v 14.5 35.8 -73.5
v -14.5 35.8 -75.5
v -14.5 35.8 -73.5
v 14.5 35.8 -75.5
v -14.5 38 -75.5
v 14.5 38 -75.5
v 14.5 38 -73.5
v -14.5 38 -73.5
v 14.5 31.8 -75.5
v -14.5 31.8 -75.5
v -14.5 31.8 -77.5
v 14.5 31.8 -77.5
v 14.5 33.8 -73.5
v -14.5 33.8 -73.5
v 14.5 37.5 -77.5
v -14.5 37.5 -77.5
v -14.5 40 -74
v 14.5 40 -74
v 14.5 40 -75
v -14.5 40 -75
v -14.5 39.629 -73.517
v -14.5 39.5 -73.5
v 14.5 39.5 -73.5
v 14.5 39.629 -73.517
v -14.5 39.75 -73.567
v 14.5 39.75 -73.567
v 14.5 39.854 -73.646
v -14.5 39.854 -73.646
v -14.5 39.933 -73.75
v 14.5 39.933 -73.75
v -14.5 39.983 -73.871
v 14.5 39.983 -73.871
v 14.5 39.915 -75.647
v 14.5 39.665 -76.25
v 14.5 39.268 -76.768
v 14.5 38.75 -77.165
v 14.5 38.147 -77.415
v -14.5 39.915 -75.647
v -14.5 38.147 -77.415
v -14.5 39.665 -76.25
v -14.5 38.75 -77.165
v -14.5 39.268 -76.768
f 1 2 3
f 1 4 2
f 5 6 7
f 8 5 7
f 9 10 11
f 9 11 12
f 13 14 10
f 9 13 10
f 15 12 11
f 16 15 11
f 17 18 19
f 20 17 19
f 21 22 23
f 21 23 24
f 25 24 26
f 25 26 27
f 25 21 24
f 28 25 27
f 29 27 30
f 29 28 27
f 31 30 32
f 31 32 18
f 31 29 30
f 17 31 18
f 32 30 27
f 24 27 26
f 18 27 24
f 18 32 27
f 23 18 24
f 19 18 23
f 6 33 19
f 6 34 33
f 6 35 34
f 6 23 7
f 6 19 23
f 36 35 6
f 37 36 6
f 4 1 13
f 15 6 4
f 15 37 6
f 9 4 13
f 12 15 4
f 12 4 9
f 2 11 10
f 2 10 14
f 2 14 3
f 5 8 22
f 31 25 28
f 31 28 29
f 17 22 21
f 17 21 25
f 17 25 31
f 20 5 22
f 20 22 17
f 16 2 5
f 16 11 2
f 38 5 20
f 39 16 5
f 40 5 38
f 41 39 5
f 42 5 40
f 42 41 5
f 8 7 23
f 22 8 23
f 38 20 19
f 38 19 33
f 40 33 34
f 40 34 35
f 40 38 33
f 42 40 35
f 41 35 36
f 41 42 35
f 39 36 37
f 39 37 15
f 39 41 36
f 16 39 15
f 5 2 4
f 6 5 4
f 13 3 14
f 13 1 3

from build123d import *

# Parameters (mm, degrees)
SKETCH1_W                       = 39
SKETCH1_H                       = 155
BOSS_EXTRUDE1_DEPTH             = 2
BOSS_EXTRUDE2_DEPTH             = 38
SKETCH3_W                       = 2
SKETCH3_H                       = 2
BOSS_EXTRUDE3_DEPTH             = 38
SKETCH4_W                       = 2
SKETCH4_H                       = 2
BOSS_EXTRUDE4_DEPTH             = 151
SKETCH6_W                       = 35
SKETCH6_H                       = 2.2
CUT_EXTRUDE1_DEPTH              = 160.340045186
SKETCH7_W                       = 35
SKETCH7_H                       = 2.2
CUT_EXTRUDE2_DEPTH              = 89.490112442
SKETCH5_W                       = 31
SKETCH5_H                       = 2
BOSS_EXTRUDE5_DEPTH             = 2
BOSS_EXTRUDE6_REACH             = 91.367
SKETCH8_W                       = 2
SKETCH8_H                       = 2
BOSS_EXTRUDE6_DIRECTION_2_REACH = 91.367
SKETCH10_W                      = 2
SKETCH10_H                      = 2.2
SKETCH10_W_2                    = 2.2
SKETCH10_H_2                    = 2
BOSS_EXTRUDE8_DEPTH             = 2
SKETCH11_W                      = 2
SKETCH11_H                      = 2.2
SKETCH11_W_2                    = 2.2
SKETCH11_H_2                    = 2
BOSS_EXTRUDE9_DEPTH             = 2
FILLET2_R                       = 2.5
SKETCH14_W                      = 36.5
SKETCH14_H                      = 7.75
BOSS_EXTRUDE10_DEPTH            = 2
SKETCH13_W                      = 31
SKETCH13_H                      = 3
CUT_EXTRUDE4_DEPTH              = 2
FILLET3_R                       = 2
FILLET4_R                       = 0.5
SKETCH15_R                      = 5.1
CUT_EXTRUDE5_DEPTH              = 90.367219941
SKETCH16_R                      = 7.1
BOSS_EXTRUDE11_DEPTH            = 1
FILLET5_R                       = 0.5
CUT_EXTRUDE3_DEPTH              = 160.340045186
FILLET6_R                       = 0.4
FILLET7_R                       = 0.5
CUT_EXTRUDE6_DEPTH              = 6
SKETCH18_W                      = 29
SKETCH18_H                      = 3
CUT_EXTRUDE8_DEPTH              = 90.367220028
CUT_EXTRUDE11_DEPTH             = 90.367220028
CUT_EXTRUDE11_DEPTH_BACK        = 90.367220028
SKETCH20_W                      = 5
SKETCH20_H                      = 40
SKETCH21_W                      = 29
SKETCH21_H                      = 22.8
CUT_EXTRUDE12_DEPTH             = 43.594013669


with BuildPart() as part:
    # Sketch1 → Boss-Extrude1 (new body)
    with BuildSketch(Plane(origin=(0, 0, 0), x_dir=(1, 0, 0), z_dir=(0, 1, 0))):
        Rectangle(SKETCH1_W, SKETCH1_H)
    extrude(amount=BOSS_EXTRUDE1_DEPTH)

    # Sketch2 → Boss-Extrude2 (add)
    with BuildSketch(Plane(origin=(0, 2, 0), x_dir=(1, 0, 0), z_dir=(0, 1, 0))):
        Polygon((-17.5, -77.5), (-17.5, -75.5), (-17.5, 75.5), (17.5, 75.5), (17.5, -75.5), (17.5, -77.5), (19.5, -77.5), (19.5, 77.5), (-19.5, 77.5), (-19.5, -77.5), align=None)
    extrude(amount=BOSS_EXTRUDE2_DEPTH)

    # Sketch3 → Boss-Extrude3 (add)
    with BuildSketch(Plane(origin=(0, 2, 0), x_dir=(1, 0, 0), z_dir=(0, 1, 0))):
        with Locations((-16.5, -76.5)):
            Rectangle(SKETCH3_W, SKETCH3_H)
        with Locations((-16.5, -72.3)):
            Rectangle(SKETCH3_W, SKETCH3_H)
        with Locations((16.5, -76.5)):
            Rectangle(SKETCH3_W, SKETCH3_H)
        with Locations((16.5, -72.3)):
            Rectangle(SKETCH3_W, SKETCH3_H)
    extrude(amount=BOSS_EXTRUDE3_DEPTH)

    # Sketch4 → Boss-Extrude4 (add)
    with BuildSketch(Plane.XY.offset(-75.5)):
        with Locations((-16.5, 39)):
            Rectangle(SKETCH4_W, SKETCH4_H)
        Polygon((-15.5, 33.8), (-17.5, 31.8), (-17.5, 35.8), (-15.5, 35.8), align=None)
        Polygon((15.5, 35.8), (17.5, 35.8), (17.5, 31.8), (15.5, 33.8), align=None)
        with Locations((16.5, 39)):
            Rectangle(SKETCH4_W, SKETCH4_H)
    extrude(amount=BOSS_EXTRUDE4_DEPTH)

    # Sketch6 → Cut-Extrude1 (cut, through all)
    with BuildSketch(Plane.XY.offset(-75.5)):
        with Locations((0, 36.9)):
            Rectangle(SKETCH6_W, SKETCH6_H)
    extrude(amount=CUT_EXTRUDE1_DEPTH, mode=Mode.SUBTRACT)

    # Sketch7 → Cut-Extrude2 (cut, through all)
    with BuildSketch(Plane(origin=(0, 2, 0), x_dir=(1, 0, 0), z_dir=(0, 1, 0))):
        with Locations((0, -74.4)):
            Rectangle(SKETCH7_W, SKETCH7_H)
    extrude(amount=CUT_EXTRUDE2_DEPTH, mode=Mode.SUBTRACT)

    # Sketch5 → Boss-Extrude5 (add)
    with BuildSketch(Plane(origin=(0, 2, 0), x_dir=(1, 0, 0), z_dir=(0, 1, 0))):
        with Locations((0, -76.5)):
            Rectangle(SKETCH5_W, SKETCH5_H)
        with Locations((0, -72.3)):
            Rectangle(SKETCH5_W, SKETCH5_H)
    extrude(amount=BOSS_EXTRUDE5_DEPTH)

    # Boss-Extrude6: up to this face of the body (flat: up to its plane)
    boss_extrude6_end = Plane(part.part.faces().sort_by_distance((17.5, 16.9, -2.1))[0])
    # Sketch8 → Boss-Extrude6 (add, up to the picked face)
    with BuildSketch(Plane(origin=(0, 0, 0), x_dir=(0, 0, -1), z_dir=(1, 0, 0)), mode=Mode.PRIVATE) as boss_extrude6_sk1:
        with Locations((74.5, 39)):
            Rectangle(SKETCH8_W, SKETCH8_H)
    boss_extrude6_tool1 = split(extrude(boss_extrude6_sk1.sketch, amount=BOSS_EXTRUDE6_REACH, mode=Mode.PRIVATE), bisect_by=boss_extrude6_end, keep=Keep.BOTH, mode=Mode.PRIVATE)
    # Sketch8 → Boss-Extrude6 (add, up to the picked face)
    with BuildSketch(Plane(origin=(0, 0, 0), x_dir=(0, 0, -1), z_dir=(1, 0, 0)), mode=Mode.PRIVATE) as boss_extrude6_sk2:
        Polygon((75.5, 35.8), (73.5, 35.8), (73.5, 33.8), (75.5, 31.8), align=None)
    boss_extrude6_tool2 = split(extrude(boss_extrude6_sk2.sketch, amount=BOSS_EXTRUDE6_REACH, mode=Mode.PRIVATE), bisect_by=boss_extrude6_end, keep=Keep.BOTH, mode=Mode.PRIVATE)
    add(boss_extrude6_tool1.solids().sort_by(Axis((0, 39, -74.5), (1, 0, 0)))[0])
    add(boss_extrude6_tool2.solids().sort_by(Axis((0, 34.244444, -74.611111), (1, 0, 0)))[0])

    # Boss-Extrude6 direction 2: up to this face of the body (flat: up to its plane)
    boss_extrude6_direction_2_end = Plane(part.part.faces().sort_by_distance((-17.5, 16.9, -2.1))[0])
    # Sketch8 → Boss-Extrude6 direction 2 (add, up to the picked face)
    with BuildSketch(Plane(origin=(0, 0, 0), x_dir=(0, 0, -1), z_dir=(1, 0, 0)), mode=Mode.PRIVATE) as boss_extrude6_direction_2_sk1:
        with Locations((74.5, 39)):
            Rectangle(SKETCH8_W, SKETCH8_H)
    boss_extrude6_direction_2_tool1 = split(extrude(boss_extrude6_direction_2_sk1.sketch, amount=-BOSS_EXTRUDE6_DIRECTION_2_REACH, mode=Mode.PRIVATE), bisect_by=boss_extrude6_direction_2_end, keep=Keep.BOTH, mode=Mode.PRIVATE)
    # Sketch8 → Boss-Extrude6 direction 2 (add, up to the picked face)
    with BuildSketch(Plane(origin=(0, 0, 0), x_dir=(0, 0, -1), z_dir=(1, 0, 0)), mode=Mode.PRIVATE) as boss_extrude6_direction_2_sk2:
        Polygon((75.5, 35.8), (73.5, 35.8), (73.5, 33.8), (75.5, 31.8), align=None)
    boss_extrude6_direction_2_tool2 = split(extrude(boss_extrude6_direction_2_sk2.sketch, amount=-BOSS_EXTRUDE6_DIRECTION_2_REACH, mode=Mode.PRIVATE), bisect_by=boss_extrude6_direction_2_end, keep=Keep.BOTH, mode=Mode.PRIVATE)
    add(boss_extrude6_direction_2_tool1.solids().sort_by(Axis((0, 39, -74.5), (-1, 0, 0)))[0])
    add(boss_extrude6_direction_2_tool2.solids().sort_by(Axis((0, 34.244444, -74.611111), (-1, 0, 0)))[0])

    # Sketch10 → Boss-Extrude8 (add)
    with BuildSketch(Plane(origin=(-17.5, 0, 0), x_dir=(0, 0, -1), z_dir=(1, 0, 0))):
        with Locations((-76.5, 36.9)):
            Rectangle(SKETCH10_W, SKETCH10_H)
        with Locations((-74.4, 39)):
            Rectangle(SKETCH10_W_2, SKETCH10_H_2)
    extrude(amount=BOSS_EXTRUDE8_DEPTH)

    # Sketch11 → Boss-Extrude9 (add)
    with BuildSketch(Plane.ZY.offset(-17.5)):
        with Locations((76.5, 36.9)):
            Rectangle(SKETCH11_W, SKETCH11_H)
        with Locations((74.4, 39)):
            Rectangle(SKETCH11_W_2, SKETCH11_H_2)
    extrude(amount=BOSS_EXTRUDE9_DEPTH)

    # Fillet2
    fillet2_edges = [part.edges().sort_by_distance(p)[0] for p in [
        (-17.5, 16.9, 71.3),
        (17.5, 16.9, 71.3),
        (19.5, 20, 77.5),
        (-19.5, 20, 77.5),
        (-19.5, 20, -77.5),
        (-17.5, 16.9, -75.5),
        (17.5, 16.9, -75.5),
        (19.5, 20, -77.5),
        (19.5, 40, 0),
        (-19.5, 40, 0),
        (19.5, 0, 0),
        (-19.5, 0, 0),
        (0, 40, -77.5),
        (0, 0, 77.5),
        (0, 0, -77.5),
        (-17.5, 40, 77.5),
        (17.5, 40, 77.5),
    ]]
    fillet(fillet2_edges, radius=FILLET2_R)

    # Sketch14 → Boss-Extrude10 (add)
    with BuildSketch(Plane.XY.offset(-75.5)):
        with Locations((0, 5.125)):
            Rectangle(SKETCH14_W, SKETCH14_H)
    extrude(amount=BOSS_EXTRUDE10_DEPTH)

    # Sketch13 → Cut-Extrude4 (cut)
    with BuildSketch(Plane(origin=(0, 0, -77.5), x_dir=(-1, 0, 0), z_dir=(0, 0, -1))):
        with Locations((0, 5.5)):
            Rectangle(SKETCH13_W, SKETCH13_H)
    extrude(amount=-CUT_EXTRUDE4_DEPTH, mode=Mode.SUBTRACT)

    # Fillet3
    fillet3_edges = [part.edges().sort_by_distance(p)[0] for p in [
        (0, 9, -73.5),
    ]]
    fillet(fillet3_edges, radius=FILLET3_R - 0.0001)  # a hair under: the kernel refuses the full size

    # Fillet4
    fillet4_edges = [part.edges().sort_by_distance(p)[0] for p in [
        (15.5, 5.5, -75.5),
        (15.5, 4, -76.5),
        (0, 7, -75.5),
        (15.5, 7, -76.5),
        (-15.5, 5.5, -75.5),
        (-15.5, 7, -76.5),
        (0, 4, -75.5),
        (-15.5, 4, -76.5),
        (15.5, 5.5, -77.5),
        (0, 4, -77.5),
        (-15.5, 5.5, -77.5),
        (0, 7, -77.5),
    ]]
    fillet(fillet4_edges, radius=FILLET4_R)

    # Sketch15 → Cut-Extrude5 (cut, through all)
    with BuildSketch(Plane.XZ):
        with Locations(Location((0, 38.75, 0), (0, 0, 270))):
            Circle(SKETCH15_R)
        with Locations(Location((0, -38.75, 0), (0, 0, 270))):
            Circle(SKETCH15_R)
    extrude(amount=-CUT_EXTRUDE5_DEPTH, mode=Mode.SUBTRACT)

    # Sketch16 → Boss-Extrude11 (add)
    with BuildSketch(Plane(origin=(0, 2, 0), x_dir=(1, 0, 0), z_dir=(0, 1, 0))):
        with Locations(Location((0, 38.75, 0), (0, 0, 270))):
            Circle(SKETCH16_R)
        with Locations(Location((0, -38.75, 0), (0, 0, 270))):
            Circle(SKETCH16_R)
    extrude(amount=BOSS_EXTRUDE11_DEPTH)

    # Fillet5
    fillet5_edges = [part.edges().sort_by_distance(p)[0] for p in [
        (0, 2, -45.85),
        (0, 3, -45.85),
        (0, 2, 31.65),
        (0, 3, 31.65),
    ]]
    fillet(fillet5_edges, radius=FILLET5_R - 0.0001)  # a hair under: the kernel refuses the full size

    # Sketch12 → Cut-Extrude3 (cut, through all)
    with BuildSketch(Plane.XY.offset(-75.5)):
        with BuildLine():
            Line((1.668907005, 12.688040659), (2.22520934, 10.250720878))
            ThreePointArc((2.22520934, 10.250720878), (4.338837391, 10.990311321), (6.234898019, 12.181685175))
            Line((6.234898019, 12.181685175), (4.676173514, 14.136263881))
            ThreePointArc((4.676173514, 14.136263881), (3.254128043, 13.242733491), (1.668907005, 12.688040659))
        make_face()
        with BuildLine():
            ThreePointArc((-6.234898019, 12.181685175), (-4.338837391, 10.990311321), (-2.22520934, 10.250720878))
            Line((-2.22520934, 10.250720878), (-1.668907005, 12.688040659))
            ThreePointArc((-1.668907005, 12.688040659), (-3.254128043, 13.242733491), (-4.676173514, 14.136263881))
            Line((-4.676173514, 14.136263881), (-6.234898019, 12.181685175))
        make_face()
        with BuildLine():
            ThreePointArc((-10, 20), (-9.749279122, 17.77479066), (-9.009688679, 15.661162609))
            Line((-9.009688679, 15.661162609), (-6.757266509, 16.745871957))
            ThreePointArc((-6.757266509, 16.745871957), (-7.311959341, 18.331092995), (-7.5, 20))
            Line((-7.5, 20), (-10, 20))
        make_face()
        with BuildLine():
            ThreePointArc((-6.234898019, 27.818314825), (-7.818314825, 26.234898019), (-9.009688679, 24.338837391))
            Line((-9.009688679, 24.338837391), (-6.757266509, 23.254128043))
            ThreePointArc((-6.757266509, 23.254128043), (-5.863736119, 24.676173514), (-4.676173514, 25.863736119))
            Line((-4.676173514, 25.863736119), (-6.234898019, 27.818314825))
        make_face()
        with BuildLine():
            ThreePointArc((-1.668907005, 27.311959341), (-0.839733571, 27.452841574), (0, 27.5))
            Line((0, 27.5), (0, 30))
            ThreePointArc((0, 30), (-1.119644761, 29.937122099), (-2.22520934, 29.749279122))
            Line((-2.22520934, 29.749279122), (-1.668907005, 27.311959341))
        make_face()
        with BuildLine():
            Line((0, 30), (0, 27.5))
            ThreePointArc((0, 27.5), (0.839733571, 27.452841574), (1.668907005, 27.311959341))
            Line((1.668907005, 27.311959341), (2.22520934, 29.749279122))
            ThreePointArc((2.22520934, 29.749279122), (1.119644761, 29.937122099), (0, 30))
        make_face()
        with BuildLine():
            Line((6.757266509, 23.254128043), (9.009688679, 24.338837391))
            ThreePointArc((9.009688679, 24.338837391), (7.818314825, 26.234898019), (6.234898019, 27.818314825))
            Line((6.234898019, 27.818314825), (4.676173514, 25.863736119))
            ThreePointArc((4.676173514, 25.863736119), (5.863736119, 24.676173514), (6.757266509, 23.254128043))
        make_face()
        with BuildLine():
            Line((6.757266509, 16.745871957), (9.009688679, 15.661162609))
            ThreePointArc((9.009688679, 15.661162609), (9.749279122, 17.77479066), (10, 20))
            Line((10, 20), (7.5, 20))
            ThreePointArc((7.5, 20), (7.311959341, 18.331092995), (6.757266509, 16.745871957))
        make_face()
        with BuildLine():
            ThreePointArc((2.5, 20), (2.43731978, 19.443697665), (2.25242217, 18.915290652))
            Line((2.25242217, 18.915290652), (4.50484434, 17.830581304))
            ThreePointArc((4.50484434, 17.830581304), (4.874639561, 18.88739533), (5, 20))
            Line((5, 20), (2.5, 20))
        make_face()
        with BuildLine():
            ThreePointArc((1.558724505, 21.954578706), (1.954578706, 21.558724505), (2.25242217, 21.084709348))
            Line((2.25242217, 21.084709348), (4.50484434, 22.169418696))
            ThreePointArc((4.50484434, 22.169418696), (3.909157412, 23.117449009), (3.117449009, 23.909157412))
            Line((3.117449009, 23.909157412), (1.558724505, 21.954578706))
        make_face()
        with BuildLine():
            Line((0, 25), (0, 22.5))
            ThreePointArc((0, 22.5), (0.27991119, 22.484280525), (0.556302335, 22.43731978))
            Line((0.556302335, 22.43731978), (1.11260467, 24.874639561))
            ThreePointArc((1.11260467, 24.874639561), (0.559822381, 24.968561049), (0, 25))
        make_face()
        with BuildLine():
            ThreePointArc((-0.556302335, 22.43731978), (-0.27991119, 22.484280525), (0, 22.5))
            Line((0, 22.5), (0, 25))
            ThreePointArc((0, 25), (-0.559822381, 24.968561049), (-1.11260467, 24.874639561))
            Line((-1.11260467, 24.874639561), (-0.556302335, 22.43731978))
        make_face()
        with BuildLine():
            ThreePointArc((-2.25242217, 21.084709348), (-1.954578706, 21.558724505), (-1.558724505, 21.954578706))
            Line((-1.558724505, 21.954578706), (-3.117449009, 23.909157412))
            ThreePointArc((-3.117449009, 23.909157412), (-3.909157412, 23.117449009), (-4.50484434, 22.169418696))
            Line((-4.50484434, 22.169418696), (-2.25242217, 21.084709348))
        make_face()
        with BuildLine():
            ThreePointArc((-2.25242217, 18.915290652), (-2.43731978, 19.443697665), (-2.5, 20))
            Line((-2.5, 20), (-5, 20))
            ThreePointArc((-5, 20), (-4.874639561, 18.88739533), (-4.50484434, 17.830581304))
            Line((-4.50484434, 17.830581304), (-2.25242217, 18.915290652))
        make_face()
        with BuildLine():
            ThreePointArc((-3.117449009, 16.090842588), (-2.169418696, 15.49515566), (-1.11260467, 15.125360439))
            Line((-1.11260467, 15.125360439), (-0.556302335, 17.56268022))
            ThreePointArc((-0.556302335, 17.56268022), (-1.084709348, 17.74757783), (-1.558724505, 18.045421294))
            Line((-1.558724505, 18.045421294), (-3.117449009, 16.090842588))
        make_face()
        with BuildLine():
            Line((0.556302335, 17.56268022), (1.11260467, 15.125360439))
            ThreePointArc((1.11260467, 15.125360439), (2.169418696, 15.49515566), (3.117449009, 16.090842588))
            Line((3.117449009, 16.090842588), (1.558724505, 18.045421294))
            ThreePointArc((1.558724505, 18.045421294), (1.084709348, 17.74757783), (0.556302335, 17.56268022))
        make_face()
    extrude(amount=-CUT_EXTRUDE3_DEPTH, mode=Mode.SUBTRACT)

    # Fillet6
    fillet6_edges = [part.edges().sort_by_distance(p)[0] for p in [
        (5.863736119, 24.676173514, -75.5),
        (5.455535766, 26.841025472, -75.5),
        (7.818314825, 26.234898019, -77.5),
        (7.883477594, 23.796482717, -77.5),
        (5.863736119, 24.676173514, -77.5),
        (5.455535766, 26.841025472, -77.5),
        (7.883477594, 23.796482717, -75.5),
        (7.818314825, 26.234898019, -75.5),
        (7.311959341, 18.331092995, -75.5),
        (8.75, 20, -75.5),
        (9.749279122, 17.77479066, -77.5),
        (7.883477594, 16.203517283, -77.5),
        (7.311959341, 18.331092995, -77.5),
        (8.75, 20, -77.5),
        (7.883477594, 16.203517283, -75.5),
        (9.749279122, 17.77479066, -75.5),
        (2.43731978, 19.443697665, -75.5),
        (3.75, 20, -75.5),
        (4.874639561, 18.88739533, -77.5),
        (3.378633255, 18.372935978, -77.5),
        (2.43731978, 19.443697665, -77.5),
        (3.75, 20, -77.5),
        (3.378633255, 18.372935978, -75.5),
        (4.874639561, 18.88739533, -75.5),
        (1.954578706, 21.558724505, -75.5),
        (2.338086757, 22.931868059, -75.5),
        (3.909157412, 23.117449009, -77.5),
        (3.378633255, 21.627064022, -77.5),
        (1.954578706, 21.558724505, -77.5),
        (2.338086757, 22.931868059, -77.5),
        (3.378633255, 21.627064022, -75.5),
        (3.909157412, 23.117449009, -75.5),
        (0, 27.5, -75.5),
        (-1.947058172, 28.530619232, -75.5),
        (0, 30, -77.5),
        (1.947058172, 28.530619232, -77.5),
        (0, 27.5, -77.5),
        (-1.947058172, 28.530619232, -77.5),
        (1.947058172, 28.530619232, -75.5),
        (0, 30, -75.5),
        (-5.863736119, 24.676173514, -75.5),
        (-7.883477594, 23.796482717, -75.5),
        (-7.818314825, 26.234898019, -77.5),
        (-5.455535766, 26.841025472, -77.5),
        (-5.863736119, 24.676173514, -77.5),
        (-7.883477594, 23.796482717, -77.5),
        (-5.455535766, 26.841025472, -75.5),
        (-7.818314825, 26.234898019, -75.5),
        (-7.311959341, 18.331092995, -75.5),
        (-7.883477594, 16.203517283, -75.5),
        (-9.749279122, 17.77479066, -77.5),
        (-8.75, 20, -77.5),
        (-7.311959341, 18.331092995, -77.5),
        (-7.883477594, 16.203517283, -77.5),
        (-8.75, 20, -75.5),
        (-9.749279122, 17.77479066, -75.5),
        (-3.254128043, 13.242733491, -75.5),
        (-1.947058172, 11.469380768, -75.5),
        (-4.338837391, 10.990311321, -77.5),
        (-5.455535766, 13.158974528, -77.5),
        (-3.254128043, 13.242733491, -77.5),
        (-1.947058172, 11.469380768, -77.5),
        (-5.455535766, 13.158974528, -75.5),
        (-4.338837391, 10.990311321, -75.5),
        (1.084709348, 17.74757783, -75.5),
        (2.338086757, 17.068131941, -75.5),
        (2.169418696, 15.49515566, -77.5),
        (0.834453502, 16.344020329, -77.5),
        (1.084709348, 17.74757783, -77.5),
        (2.338086757, 17.068131941, -77.5),
        (0.834453502, 16.344020329, -75.5),
        (2.169418696, 15.49515566, -75.5),
        (-2.43731978, 19.443697665, -75.5),
        (-3.378633255, 18.372935978, -75.5),
        (-4.874639561, 18.88739533, -77.5),
        (-3.75, 20, -77.5),
        (-2.43731978, 19.443697665, -77.5),
        (-3.378633255, 18.372935978, -77.5),
        (-3.75, 20, -75.5),
        (-4.874639561, 18.88739533, -75.5),
        (-1.084709348, 17.74757783, -75.5),
        (-0.834453502, 16.344020329, -75.5),
        (-2.169418696, 15.49515566, -77.5),
        (-2.338086757, 17.068131941, -77.5),
        (-1.084709348, 17.74757783, -77.5),
        (-0.834453502, 16.344020329, -77.5),
        (-2.338086757, 17.068131941, -75.5),
        (-2.169418696, 15.49515566, -75.5),
        (-1.954578706, 21.558724505, -75.5),
        (-3.378633255, 21.627064022, -75.5),
        (-3.909157412, 23.117449009, -77.5),
        (-2.338086757, 22.931868059, -77.5),
        (-1.954578706, 21.558724505, -77.5),
        (-3.378633255, 21.627064022, -77.5),
        (-2.338086757, 22.931868059, -75.5),
        (-3.909157412, 23.117449009, -75.5),
        (0, 25, -77.5),
        (0.834453502, 23.655979671, -77.5),
        (0, 22.5, -75.5),
        (-0.834453502, 23.655979671, -75.5),
        (0, 22.5, -77.5),
        (-0.834453502, 23.655979671, -77.5),
        (0, 25, -75.5),
        (0.834453502, 23.655979671, -75.5),
        (3.254128043, 13.242733491, -75.5),
        (5.455535766, 13.158974528, -75.5),
        (4.338837391, 10.990311321, -77.5),
        (1.947058172, 11.469380768, -77.5),
        (3.254128043, 13.242733491, -77.5),
        (5.455535766, 13.158974528, -77.5),
        (1.947058172, 11.469380768, -75.5),
        (4.338837391, 10.990311321, -75.5),
    ]]
    fillet(fillet6_edges, radius=FILLET6_R)

    # Fillet7
    fillet7_edges = [part.edges().sort_by_distance(p)[0] for p in [
        (15.5, 40, 0.75),
        (0, 4, 77.5),
        (0, 40, -73.5),
        (-15.5, 40, 0.75),
        (-15.5, 20.75, 77.5),
        (-15.5, 39.267766953, 76.767766953),
        (15.5, 20.75, 77.5),
        (15.5, 39.267766953, 76.767766953),
    ]]
    fillet(fillet7_edges, radius=FILLET7_R)

    # Sketch17 → Cut-Extrude6 (cut)
    with BuildSketch(Plane.XZ):
        Polygon((-17, -77.5), (-17, 70.299999999), (-14.999999999, 71.3), (-14.999999999, 77.5), (14.999999999, 77.5), (14.999999999, 71.3), (17, 70.299999999), (17, -77.5), align=None)
    extrude(amount=-CUT_EXTRUDE6_DEPTH, mode=Mode.SUBTRACT)

    # Sketch18 → Cut-Extrude8 (cut, through all)
    with BuildSketch(Plane.XY):
        with Locations((0, 7.5)):
            Rectangle(SKETCH18_W, SKETCH18_H)
    extrude(amount=-CUT_EXTRUDE8_DEPTH, mode=Mode.SUBTRACT)

    # Sketch20 → Cut-Extrude11 (cut, two sides: drawn at the far end of the back side and taken through both)
    with BuildSketch(Plane.XY.offset(-CUT_EXTRUDE11_DEPTH_BACK)):
        Polygon((19.5, 40), (14.5, 40), (14.5, 6), (14.5, 0), (19.5, 0), align=None)
        with Locations((-17, 20)):
            Rectangle(SKETCH20_W, SKETCH20_H)
    extrude(amount=CUT_EXTRUDE11_DEPTH + CUT_EXTRUDE11_DEPTH_BACK, mode=Mode.SUBTRACT)

    # Sketch21 → Cut-Extrude12 (cut, through all)
    with BuildSketch(Plane.XY.offset(-75.5)):
        with Locations((0, 20.4)):
            Rectangle(SKETCH21_W, SKETCH21_H)
    extrude(amount=-CUT_EXTRUDE12_DEPTH, mode=Mode.SUBTRACT)


solid = part.part
